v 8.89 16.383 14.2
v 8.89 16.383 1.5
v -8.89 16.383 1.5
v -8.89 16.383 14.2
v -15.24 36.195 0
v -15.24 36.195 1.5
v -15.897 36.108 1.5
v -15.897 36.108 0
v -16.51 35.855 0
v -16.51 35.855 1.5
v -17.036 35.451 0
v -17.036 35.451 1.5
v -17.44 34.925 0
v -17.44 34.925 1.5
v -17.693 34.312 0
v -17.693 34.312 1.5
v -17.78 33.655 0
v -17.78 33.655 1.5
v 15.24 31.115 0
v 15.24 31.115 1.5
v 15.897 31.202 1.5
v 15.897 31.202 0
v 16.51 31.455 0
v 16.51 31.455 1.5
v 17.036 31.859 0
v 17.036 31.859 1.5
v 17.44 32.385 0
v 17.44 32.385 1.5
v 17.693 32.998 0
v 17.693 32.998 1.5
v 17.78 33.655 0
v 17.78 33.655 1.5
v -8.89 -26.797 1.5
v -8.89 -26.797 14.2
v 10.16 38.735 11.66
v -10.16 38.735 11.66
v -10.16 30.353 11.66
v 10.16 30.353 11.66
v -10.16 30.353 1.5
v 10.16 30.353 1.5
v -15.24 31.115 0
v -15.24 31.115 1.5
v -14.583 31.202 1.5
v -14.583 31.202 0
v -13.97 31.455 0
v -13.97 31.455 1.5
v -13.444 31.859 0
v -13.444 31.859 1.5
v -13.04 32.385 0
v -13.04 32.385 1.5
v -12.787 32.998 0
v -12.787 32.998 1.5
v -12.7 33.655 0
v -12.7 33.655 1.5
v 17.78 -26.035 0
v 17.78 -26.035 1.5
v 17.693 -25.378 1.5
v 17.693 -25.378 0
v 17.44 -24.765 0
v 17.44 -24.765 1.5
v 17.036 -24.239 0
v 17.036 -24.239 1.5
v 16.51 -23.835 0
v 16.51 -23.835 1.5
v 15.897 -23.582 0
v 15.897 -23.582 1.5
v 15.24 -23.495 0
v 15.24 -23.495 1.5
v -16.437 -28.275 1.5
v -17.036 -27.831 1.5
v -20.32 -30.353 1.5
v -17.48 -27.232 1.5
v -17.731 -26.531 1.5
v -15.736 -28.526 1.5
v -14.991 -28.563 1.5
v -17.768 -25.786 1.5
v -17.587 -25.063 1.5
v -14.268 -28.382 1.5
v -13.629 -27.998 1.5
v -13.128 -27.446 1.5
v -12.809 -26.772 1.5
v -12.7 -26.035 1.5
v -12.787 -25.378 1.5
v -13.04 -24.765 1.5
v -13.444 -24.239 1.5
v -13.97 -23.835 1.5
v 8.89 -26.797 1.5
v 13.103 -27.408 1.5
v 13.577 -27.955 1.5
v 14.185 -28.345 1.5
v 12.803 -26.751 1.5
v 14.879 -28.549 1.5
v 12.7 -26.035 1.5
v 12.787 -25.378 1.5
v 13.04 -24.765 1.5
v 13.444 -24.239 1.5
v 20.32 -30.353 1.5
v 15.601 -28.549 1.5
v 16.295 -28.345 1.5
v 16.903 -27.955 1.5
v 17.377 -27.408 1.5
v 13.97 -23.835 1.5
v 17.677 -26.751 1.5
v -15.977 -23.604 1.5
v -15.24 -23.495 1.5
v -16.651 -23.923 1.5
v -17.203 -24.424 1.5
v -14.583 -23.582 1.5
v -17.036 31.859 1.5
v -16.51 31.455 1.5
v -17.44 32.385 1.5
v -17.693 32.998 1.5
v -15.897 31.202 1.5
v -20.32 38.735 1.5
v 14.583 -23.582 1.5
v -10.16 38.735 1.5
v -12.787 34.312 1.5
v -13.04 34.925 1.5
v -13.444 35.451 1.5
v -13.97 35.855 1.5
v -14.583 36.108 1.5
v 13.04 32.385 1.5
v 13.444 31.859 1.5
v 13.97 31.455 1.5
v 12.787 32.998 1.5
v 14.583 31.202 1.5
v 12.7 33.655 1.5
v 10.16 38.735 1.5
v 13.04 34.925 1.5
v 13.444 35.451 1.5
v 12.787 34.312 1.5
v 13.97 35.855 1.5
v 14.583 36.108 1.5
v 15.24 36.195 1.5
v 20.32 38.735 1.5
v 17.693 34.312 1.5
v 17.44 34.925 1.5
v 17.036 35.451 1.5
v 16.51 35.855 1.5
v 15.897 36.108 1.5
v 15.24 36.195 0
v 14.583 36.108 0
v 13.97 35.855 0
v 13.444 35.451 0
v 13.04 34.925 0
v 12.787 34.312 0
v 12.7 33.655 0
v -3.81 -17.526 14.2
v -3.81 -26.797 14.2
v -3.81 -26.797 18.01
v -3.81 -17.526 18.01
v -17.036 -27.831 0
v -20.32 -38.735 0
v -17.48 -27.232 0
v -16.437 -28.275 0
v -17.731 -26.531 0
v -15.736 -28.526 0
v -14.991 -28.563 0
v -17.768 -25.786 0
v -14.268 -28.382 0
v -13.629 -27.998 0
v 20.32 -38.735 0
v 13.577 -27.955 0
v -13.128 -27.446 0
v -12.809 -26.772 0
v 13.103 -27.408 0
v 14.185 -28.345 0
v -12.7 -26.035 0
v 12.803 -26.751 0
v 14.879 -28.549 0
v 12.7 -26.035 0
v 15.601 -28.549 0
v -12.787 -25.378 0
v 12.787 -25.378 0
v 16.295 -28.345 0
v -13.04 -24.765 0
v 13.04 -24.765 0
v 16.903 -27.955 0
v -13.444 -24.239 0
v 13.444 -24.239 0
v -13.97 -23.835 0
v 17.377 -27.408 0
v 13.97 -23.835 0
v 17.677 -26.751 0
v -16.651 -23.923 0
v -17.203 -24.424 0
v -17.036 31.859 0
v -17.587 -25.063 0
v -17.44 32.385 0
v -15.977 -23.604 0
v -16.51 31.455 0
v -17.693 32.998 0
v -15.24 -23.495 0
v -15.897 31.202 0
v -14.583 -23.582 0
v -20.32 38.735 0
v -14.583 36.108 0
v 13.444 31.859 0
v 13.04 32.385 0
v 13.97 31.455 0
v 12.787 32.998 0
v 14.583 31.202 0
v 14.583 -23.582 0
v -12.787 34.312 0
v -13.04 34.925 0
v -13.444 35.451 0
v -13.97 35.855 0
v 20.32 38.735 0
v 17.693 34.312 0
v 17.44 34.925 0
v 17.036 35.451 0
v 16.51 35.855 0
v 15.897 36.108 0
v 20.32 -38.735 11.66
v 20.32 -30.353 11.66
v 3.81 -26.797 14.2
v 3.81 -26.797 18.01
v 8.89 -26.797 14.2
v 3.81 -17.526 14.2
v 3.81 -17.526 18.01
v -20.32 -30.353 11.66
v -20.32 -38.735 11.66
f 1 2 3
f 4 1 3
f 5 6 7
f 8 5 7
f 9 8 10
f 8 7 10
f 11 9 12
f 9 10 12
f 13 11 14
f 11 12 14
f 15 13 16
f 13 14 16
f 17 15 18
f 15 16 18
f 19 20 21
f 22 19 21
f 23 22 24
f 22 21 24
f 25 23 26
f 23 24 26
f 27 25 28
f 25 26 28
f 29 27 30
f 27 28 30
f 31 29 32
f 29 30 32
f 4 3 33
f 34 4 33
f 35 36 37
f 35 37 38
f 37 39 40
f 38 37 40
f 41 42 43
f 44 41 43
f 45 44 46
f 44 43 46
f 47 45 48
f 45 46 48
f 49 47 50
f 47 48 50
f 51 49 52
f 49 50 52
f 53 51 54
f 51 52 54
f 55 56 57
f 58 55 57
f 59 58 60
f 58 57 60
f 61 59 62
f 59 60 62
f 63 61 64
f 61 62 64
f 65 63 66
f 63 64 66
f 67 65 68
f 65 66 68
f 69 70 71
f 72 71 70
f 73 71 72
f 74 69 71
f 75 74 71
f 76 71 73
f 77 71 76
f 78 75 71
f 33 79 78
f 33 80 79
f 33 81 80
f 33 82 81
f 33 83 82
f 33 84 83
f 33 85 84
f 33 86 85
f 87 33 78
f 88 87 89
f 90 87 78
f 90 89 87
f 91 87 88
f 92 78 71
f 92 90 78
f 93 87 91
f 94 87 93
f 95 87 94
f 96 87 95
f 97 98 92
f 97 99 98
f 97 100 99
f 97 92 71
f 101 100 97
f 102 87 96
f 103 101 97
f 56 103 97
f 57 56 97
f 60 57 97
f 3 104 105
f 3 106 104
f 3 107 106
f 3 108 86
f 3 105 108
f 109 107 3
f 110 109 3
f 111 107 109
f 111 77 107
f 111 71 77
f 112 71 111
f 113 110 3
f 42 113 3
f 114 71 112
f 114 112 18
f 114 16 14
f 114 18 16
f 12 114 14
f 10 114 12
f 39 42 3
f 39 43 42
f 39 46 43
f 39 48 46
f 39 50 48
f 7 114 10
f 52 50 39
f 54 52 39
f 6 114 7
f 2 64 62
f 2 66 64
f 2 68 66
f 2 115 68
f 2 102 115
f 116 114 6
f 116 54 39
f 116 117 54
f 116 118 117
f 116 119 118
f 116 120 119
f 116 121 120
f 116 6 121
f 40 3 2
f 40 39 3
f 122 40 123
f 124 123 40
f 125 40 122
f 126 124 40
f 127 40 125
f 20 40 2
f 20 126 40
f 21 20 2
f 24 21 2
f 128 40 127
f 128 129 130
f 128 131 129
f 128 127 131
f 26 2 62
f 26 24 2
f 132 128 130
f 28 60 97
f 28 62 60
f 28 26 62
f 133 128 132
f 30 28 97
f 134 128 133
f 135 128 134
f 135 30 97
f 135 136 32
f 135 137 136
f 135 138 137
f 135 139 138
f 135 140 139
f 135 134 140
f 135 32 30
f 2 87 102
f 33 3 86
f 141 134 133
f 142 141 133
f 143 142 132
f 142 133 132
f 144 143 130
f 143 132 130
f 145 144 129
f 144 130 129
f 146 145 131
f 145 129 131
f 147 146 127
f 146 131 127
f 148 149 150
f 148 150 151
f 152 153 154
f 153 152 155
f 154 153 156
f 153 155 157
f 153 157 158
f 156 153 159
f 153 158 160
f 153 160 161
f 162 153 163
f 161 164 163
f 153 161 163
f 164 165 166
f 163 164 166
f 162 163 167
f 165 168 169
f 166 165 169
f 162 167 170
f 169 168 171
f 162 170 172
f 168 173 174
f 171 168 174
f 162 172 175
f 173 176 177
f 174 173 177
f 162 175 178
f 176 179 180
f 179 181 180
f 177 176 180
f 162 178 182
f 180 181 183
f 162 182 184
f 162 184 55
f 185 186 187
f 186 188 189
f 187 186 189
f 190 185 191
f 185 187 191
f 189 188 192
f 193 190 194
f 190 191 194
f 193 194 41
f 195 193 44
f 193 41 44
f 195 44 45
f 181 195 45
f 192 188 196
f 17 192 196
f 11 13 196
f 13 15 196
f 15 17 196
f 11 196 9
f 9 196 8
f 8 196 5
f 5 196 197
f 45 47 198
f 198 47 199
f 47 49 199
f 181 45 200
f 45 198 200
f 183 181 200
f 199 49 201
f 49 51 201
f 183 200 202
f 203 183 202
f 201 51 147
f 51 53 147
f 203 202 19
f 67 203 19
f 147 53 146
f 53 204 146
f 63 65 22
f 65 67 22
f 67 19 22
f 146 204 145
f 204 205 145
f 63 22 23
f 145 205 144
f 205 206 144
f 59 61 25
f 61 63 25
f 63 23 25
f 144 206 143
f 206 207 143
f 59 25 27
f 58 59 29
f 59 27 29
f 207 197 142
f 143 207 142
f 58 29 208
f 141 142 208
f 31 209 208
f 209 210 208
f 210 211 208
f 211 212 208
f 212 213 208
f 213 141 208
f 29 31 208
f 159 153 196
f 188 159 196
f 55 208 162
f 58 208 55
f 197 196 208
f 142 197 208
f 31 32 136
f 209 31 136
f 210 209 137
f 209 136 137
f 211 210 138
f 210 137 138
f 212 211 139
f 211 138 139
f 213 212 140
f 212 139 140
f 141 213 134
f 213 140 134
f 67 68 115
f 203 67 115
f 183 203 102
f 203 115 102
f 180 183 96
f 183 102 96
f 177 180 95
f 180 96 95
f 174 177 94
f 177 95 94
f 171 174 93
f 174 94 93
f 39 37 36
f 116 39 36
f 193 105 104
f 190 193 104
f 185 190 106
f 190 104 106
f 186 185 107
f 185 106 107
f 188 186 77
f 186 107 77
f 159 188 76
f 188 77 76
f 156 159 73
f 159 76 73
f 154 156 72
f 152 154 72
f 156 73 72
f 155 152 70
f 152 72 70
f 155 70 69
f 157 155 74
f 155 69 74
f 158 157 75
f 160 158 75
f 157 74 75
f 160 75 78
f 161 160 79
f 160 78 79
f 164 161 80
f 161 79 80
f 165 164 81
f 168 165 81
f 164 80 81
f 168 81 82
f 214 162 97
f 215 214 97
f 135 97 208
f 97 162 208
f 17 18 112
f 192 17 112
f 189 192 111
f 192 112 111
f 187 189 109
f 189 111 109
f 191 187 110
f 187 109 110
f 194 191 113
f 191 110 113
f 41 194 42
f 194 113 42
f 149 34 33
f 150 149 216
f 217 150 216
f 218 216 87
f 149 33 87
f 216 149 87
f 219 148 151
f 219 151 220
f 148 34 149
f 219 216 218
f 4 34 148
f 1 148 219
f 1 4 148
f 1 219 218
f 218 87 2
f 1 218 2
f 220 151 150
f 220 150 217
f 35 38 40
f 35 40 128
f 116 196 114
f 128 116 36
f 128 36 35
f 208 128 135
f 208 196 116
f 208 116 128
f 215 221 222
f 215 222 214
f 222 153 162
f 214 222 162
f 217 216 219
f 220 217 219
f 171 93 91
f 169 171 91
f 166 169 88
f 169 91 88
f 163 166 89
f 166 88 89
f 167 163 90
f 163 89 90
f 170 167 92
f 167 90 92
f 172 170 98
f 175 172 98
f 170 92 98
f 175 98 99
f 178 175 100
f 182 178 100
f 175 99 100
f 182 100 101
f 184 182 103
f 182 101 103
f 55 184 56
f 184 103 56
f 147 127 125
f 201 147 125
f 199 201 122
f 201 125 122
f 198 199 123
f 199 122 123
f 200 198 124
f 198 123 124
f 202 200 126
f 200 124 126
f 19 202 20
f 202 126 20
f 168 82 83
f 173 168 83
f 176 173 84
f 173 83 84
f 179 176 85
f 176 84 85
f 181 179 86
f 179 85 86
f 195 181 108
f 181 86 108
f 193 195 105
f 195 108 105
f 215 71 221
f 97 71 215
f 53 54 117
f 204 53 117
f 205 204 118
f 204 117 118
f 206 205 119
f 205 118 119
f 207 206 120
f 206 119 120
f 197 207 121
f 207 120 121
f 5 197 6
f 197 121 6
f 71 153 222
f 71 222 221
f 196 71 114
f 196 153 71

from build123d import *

# Parameters (mm, degrees)
F0_W      = 40.64
F0_H      = 77.47
F1_DEPTH  = 1.5
F2_W      = 40.64
F2_H      = 8.382
F3_DEPTH  = 10.16
F4_W      = 10.16
F4_H      = 8.382
F5_DEPTH  = 10.16
F7_DEPTH  = 1.5
F9_DEPTH  = 12.7
F10_W     = 7.62
F10_H     = 9.271
F11_DEPTH = 3.81


with BuildPart() as f1:
    # F0 (on Top) → F1 (new body)
    with BuildSketch(Plane.XY):
        Rectangle(F0_W, F0_H)
    extrude(amount=F1_DEPTH)

    # F2 (on face) → F3 (join)
    with BuildSketch(Plane.XY.offset(1.5)):
        with Locations((0, 34.544)):
            Rectangle(F2_W, F2_H)
        with Locations((0, -34.544)):
            Rectangle(F2_W, F2_H)
    extrude(amount=F3_DEPTH)

    # F4 (on face) → F5 (cut, through all)
    with BuildSketch(Plane.XY.offset(11.66)):
        with Locations((-15.24, 34.544)):
            Rectangle(F4_W, F4_H)
        with Locations((15.24, 34.544)):
            Rectangle(F4_W, F4_H)
    extrude(amount=-F5_DEPTH, mode=Mode.SUBTRACT)

    # F6 (on face) → F7 (cut, through all)
    with BuildSketch(Plane.XY.offset(1.5)):
        with BuildLine():
            ThreePointArc((-15.24, 31.115), (-13.4439487758, 31.8589487758), (-12.7, 33.655))
            ThreePointArc((-12.7, 33.655), (-13.4439487758, 35.4510512242), (-15.24, 36.195))
            ThreePointArc((-15.24, 36.195), (-17.0360512242, 35.4510512242), (-17.78, 33.655))
            ThreePointArc((-17.78, 33.655), (-17.0360512242, 31.8589487758), (-15.24, 31.115))
        make_face()
        with BuildLine():
            ThreePointArc((15.24, 36.195), (13.4439487758, 35.4510512242), (12.7, 33.655))
            ThreePointArc((12.7, 33.655), (13.4439487758, 31.8589487758), (15.24, 31.115))
            ThreePointArc((15.24, 31.115), (17.0360512242, 31.8589487758), (17.78, 33.655))
            ThreePointArc((17.78, 33.655), (17.0360512242, 35.4510512242), (15.24, 36.195))
        make_face()
        with BuildLine():
            ThreePointArc((17.78, -26.035), (17.0360512242, -24.2389487758), (15.24, -23.495))
            ThreePointArc((15.24, -23.495), (13.4439487758, -24.2389487758), (12.7, -26.035))
            ThreePointArc((12.7, -26.035), (15.24, -28.575), (17.78, -26.035))
        make_face()
        with BuildLine():
            ThreePointArc((-15.24, -23.495), (-17.0360512242, -27.8310512242), (-12.7, -26.035))
            ThreePointArc((-12.7, -26.035), (-13.4439487758, -24.2389487758), (-15.24, -23.495))
        make_face()
    extrude(amount=-F7_DEPTH, mode=Mode.SUBTRACT)

    # F8 (on face) → F9 (join)
    with BuildSketch(Plane.XY.offset(1.5)):
        Polygon((8.89, -26.797), (8.89, 16.383), (0, 16.383), (-8.89, 16.383), (-8.89, -26.797), align=None)
    extrude(amount=F9_DEPTH)

    # F10 (on face) → F11 (join)
    with BuildSketch(Plane.XY.offset(14.2)):
        with Locations((0, -22.1615)):
            Rectangle(F10_W, F10_H)
    extrude(amount=F11_DEPTH)


solid = f1.part
